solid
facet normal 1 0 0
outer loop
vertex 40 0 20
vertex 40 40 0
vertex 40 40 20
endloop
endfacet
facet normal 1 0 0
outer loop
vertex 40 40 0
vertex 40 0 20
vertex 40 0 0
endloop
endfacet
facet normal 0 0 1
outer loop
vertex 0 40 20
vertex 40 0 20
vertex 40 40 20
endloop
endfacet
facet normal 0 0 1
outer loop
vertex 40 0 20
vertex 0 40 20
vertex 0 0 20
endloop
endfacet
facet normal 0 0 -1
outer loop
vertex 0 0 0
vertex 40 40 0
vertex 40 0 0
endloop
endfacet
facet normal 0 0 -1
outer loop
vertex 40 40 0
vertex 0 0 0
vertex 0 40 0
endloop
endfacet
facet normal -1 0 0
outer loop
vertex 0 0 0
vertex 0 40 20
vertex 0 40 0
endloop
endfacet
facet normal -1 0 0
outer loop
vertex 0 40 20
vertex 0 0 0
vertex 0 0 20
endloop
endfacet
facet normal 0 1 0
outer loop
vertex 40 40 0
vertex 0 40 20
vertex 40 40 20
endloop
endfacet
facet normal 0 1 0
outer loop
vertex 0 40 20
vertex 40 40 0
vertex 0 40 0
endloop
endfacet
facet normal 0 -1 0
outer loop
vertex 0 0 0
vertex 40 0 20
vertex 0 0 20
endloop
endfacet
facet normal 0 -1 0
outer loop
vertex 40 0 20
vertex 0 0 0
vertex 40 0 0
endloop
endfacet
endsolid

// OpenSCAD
// Parameters
block_size = 40;       // Width and depth of the block
block_height = 20;     // Height of the block
cavity_depth = 10;     // Depth of the pyramidal cavity

module pyramidal_cavity_block() {
    difference() {
        // Main solid block
        cube([block_size, block_size, block_height]);

        // Pyramidal cavity
        translate([0, 0, block_height - cavity_depth])
            translate([block_size/2, block_size/2, 0])
                rotate([0, 0, 0])
                    polyhedron(
                        points=[
                            [ -block_size/2, -block_size/2, 0],
                            [  block_size/2, -block_size/2, 0],
                            [  block_size/2,  block_size/2, 0],
                            [ -block_size/2,  block_size/2, 0],
                            [ 0, 0, cavity_depth]
                        ],
                        faces=[
                            [0, 1, 4],
                            [1, 2, 4],
                            [2, 3, 4],
                            [3, 0, 4],
                            [0, 1, 2, 3]
                        ]
                    );
    }
}

// Render the model
pyramidal_cavity_block();
